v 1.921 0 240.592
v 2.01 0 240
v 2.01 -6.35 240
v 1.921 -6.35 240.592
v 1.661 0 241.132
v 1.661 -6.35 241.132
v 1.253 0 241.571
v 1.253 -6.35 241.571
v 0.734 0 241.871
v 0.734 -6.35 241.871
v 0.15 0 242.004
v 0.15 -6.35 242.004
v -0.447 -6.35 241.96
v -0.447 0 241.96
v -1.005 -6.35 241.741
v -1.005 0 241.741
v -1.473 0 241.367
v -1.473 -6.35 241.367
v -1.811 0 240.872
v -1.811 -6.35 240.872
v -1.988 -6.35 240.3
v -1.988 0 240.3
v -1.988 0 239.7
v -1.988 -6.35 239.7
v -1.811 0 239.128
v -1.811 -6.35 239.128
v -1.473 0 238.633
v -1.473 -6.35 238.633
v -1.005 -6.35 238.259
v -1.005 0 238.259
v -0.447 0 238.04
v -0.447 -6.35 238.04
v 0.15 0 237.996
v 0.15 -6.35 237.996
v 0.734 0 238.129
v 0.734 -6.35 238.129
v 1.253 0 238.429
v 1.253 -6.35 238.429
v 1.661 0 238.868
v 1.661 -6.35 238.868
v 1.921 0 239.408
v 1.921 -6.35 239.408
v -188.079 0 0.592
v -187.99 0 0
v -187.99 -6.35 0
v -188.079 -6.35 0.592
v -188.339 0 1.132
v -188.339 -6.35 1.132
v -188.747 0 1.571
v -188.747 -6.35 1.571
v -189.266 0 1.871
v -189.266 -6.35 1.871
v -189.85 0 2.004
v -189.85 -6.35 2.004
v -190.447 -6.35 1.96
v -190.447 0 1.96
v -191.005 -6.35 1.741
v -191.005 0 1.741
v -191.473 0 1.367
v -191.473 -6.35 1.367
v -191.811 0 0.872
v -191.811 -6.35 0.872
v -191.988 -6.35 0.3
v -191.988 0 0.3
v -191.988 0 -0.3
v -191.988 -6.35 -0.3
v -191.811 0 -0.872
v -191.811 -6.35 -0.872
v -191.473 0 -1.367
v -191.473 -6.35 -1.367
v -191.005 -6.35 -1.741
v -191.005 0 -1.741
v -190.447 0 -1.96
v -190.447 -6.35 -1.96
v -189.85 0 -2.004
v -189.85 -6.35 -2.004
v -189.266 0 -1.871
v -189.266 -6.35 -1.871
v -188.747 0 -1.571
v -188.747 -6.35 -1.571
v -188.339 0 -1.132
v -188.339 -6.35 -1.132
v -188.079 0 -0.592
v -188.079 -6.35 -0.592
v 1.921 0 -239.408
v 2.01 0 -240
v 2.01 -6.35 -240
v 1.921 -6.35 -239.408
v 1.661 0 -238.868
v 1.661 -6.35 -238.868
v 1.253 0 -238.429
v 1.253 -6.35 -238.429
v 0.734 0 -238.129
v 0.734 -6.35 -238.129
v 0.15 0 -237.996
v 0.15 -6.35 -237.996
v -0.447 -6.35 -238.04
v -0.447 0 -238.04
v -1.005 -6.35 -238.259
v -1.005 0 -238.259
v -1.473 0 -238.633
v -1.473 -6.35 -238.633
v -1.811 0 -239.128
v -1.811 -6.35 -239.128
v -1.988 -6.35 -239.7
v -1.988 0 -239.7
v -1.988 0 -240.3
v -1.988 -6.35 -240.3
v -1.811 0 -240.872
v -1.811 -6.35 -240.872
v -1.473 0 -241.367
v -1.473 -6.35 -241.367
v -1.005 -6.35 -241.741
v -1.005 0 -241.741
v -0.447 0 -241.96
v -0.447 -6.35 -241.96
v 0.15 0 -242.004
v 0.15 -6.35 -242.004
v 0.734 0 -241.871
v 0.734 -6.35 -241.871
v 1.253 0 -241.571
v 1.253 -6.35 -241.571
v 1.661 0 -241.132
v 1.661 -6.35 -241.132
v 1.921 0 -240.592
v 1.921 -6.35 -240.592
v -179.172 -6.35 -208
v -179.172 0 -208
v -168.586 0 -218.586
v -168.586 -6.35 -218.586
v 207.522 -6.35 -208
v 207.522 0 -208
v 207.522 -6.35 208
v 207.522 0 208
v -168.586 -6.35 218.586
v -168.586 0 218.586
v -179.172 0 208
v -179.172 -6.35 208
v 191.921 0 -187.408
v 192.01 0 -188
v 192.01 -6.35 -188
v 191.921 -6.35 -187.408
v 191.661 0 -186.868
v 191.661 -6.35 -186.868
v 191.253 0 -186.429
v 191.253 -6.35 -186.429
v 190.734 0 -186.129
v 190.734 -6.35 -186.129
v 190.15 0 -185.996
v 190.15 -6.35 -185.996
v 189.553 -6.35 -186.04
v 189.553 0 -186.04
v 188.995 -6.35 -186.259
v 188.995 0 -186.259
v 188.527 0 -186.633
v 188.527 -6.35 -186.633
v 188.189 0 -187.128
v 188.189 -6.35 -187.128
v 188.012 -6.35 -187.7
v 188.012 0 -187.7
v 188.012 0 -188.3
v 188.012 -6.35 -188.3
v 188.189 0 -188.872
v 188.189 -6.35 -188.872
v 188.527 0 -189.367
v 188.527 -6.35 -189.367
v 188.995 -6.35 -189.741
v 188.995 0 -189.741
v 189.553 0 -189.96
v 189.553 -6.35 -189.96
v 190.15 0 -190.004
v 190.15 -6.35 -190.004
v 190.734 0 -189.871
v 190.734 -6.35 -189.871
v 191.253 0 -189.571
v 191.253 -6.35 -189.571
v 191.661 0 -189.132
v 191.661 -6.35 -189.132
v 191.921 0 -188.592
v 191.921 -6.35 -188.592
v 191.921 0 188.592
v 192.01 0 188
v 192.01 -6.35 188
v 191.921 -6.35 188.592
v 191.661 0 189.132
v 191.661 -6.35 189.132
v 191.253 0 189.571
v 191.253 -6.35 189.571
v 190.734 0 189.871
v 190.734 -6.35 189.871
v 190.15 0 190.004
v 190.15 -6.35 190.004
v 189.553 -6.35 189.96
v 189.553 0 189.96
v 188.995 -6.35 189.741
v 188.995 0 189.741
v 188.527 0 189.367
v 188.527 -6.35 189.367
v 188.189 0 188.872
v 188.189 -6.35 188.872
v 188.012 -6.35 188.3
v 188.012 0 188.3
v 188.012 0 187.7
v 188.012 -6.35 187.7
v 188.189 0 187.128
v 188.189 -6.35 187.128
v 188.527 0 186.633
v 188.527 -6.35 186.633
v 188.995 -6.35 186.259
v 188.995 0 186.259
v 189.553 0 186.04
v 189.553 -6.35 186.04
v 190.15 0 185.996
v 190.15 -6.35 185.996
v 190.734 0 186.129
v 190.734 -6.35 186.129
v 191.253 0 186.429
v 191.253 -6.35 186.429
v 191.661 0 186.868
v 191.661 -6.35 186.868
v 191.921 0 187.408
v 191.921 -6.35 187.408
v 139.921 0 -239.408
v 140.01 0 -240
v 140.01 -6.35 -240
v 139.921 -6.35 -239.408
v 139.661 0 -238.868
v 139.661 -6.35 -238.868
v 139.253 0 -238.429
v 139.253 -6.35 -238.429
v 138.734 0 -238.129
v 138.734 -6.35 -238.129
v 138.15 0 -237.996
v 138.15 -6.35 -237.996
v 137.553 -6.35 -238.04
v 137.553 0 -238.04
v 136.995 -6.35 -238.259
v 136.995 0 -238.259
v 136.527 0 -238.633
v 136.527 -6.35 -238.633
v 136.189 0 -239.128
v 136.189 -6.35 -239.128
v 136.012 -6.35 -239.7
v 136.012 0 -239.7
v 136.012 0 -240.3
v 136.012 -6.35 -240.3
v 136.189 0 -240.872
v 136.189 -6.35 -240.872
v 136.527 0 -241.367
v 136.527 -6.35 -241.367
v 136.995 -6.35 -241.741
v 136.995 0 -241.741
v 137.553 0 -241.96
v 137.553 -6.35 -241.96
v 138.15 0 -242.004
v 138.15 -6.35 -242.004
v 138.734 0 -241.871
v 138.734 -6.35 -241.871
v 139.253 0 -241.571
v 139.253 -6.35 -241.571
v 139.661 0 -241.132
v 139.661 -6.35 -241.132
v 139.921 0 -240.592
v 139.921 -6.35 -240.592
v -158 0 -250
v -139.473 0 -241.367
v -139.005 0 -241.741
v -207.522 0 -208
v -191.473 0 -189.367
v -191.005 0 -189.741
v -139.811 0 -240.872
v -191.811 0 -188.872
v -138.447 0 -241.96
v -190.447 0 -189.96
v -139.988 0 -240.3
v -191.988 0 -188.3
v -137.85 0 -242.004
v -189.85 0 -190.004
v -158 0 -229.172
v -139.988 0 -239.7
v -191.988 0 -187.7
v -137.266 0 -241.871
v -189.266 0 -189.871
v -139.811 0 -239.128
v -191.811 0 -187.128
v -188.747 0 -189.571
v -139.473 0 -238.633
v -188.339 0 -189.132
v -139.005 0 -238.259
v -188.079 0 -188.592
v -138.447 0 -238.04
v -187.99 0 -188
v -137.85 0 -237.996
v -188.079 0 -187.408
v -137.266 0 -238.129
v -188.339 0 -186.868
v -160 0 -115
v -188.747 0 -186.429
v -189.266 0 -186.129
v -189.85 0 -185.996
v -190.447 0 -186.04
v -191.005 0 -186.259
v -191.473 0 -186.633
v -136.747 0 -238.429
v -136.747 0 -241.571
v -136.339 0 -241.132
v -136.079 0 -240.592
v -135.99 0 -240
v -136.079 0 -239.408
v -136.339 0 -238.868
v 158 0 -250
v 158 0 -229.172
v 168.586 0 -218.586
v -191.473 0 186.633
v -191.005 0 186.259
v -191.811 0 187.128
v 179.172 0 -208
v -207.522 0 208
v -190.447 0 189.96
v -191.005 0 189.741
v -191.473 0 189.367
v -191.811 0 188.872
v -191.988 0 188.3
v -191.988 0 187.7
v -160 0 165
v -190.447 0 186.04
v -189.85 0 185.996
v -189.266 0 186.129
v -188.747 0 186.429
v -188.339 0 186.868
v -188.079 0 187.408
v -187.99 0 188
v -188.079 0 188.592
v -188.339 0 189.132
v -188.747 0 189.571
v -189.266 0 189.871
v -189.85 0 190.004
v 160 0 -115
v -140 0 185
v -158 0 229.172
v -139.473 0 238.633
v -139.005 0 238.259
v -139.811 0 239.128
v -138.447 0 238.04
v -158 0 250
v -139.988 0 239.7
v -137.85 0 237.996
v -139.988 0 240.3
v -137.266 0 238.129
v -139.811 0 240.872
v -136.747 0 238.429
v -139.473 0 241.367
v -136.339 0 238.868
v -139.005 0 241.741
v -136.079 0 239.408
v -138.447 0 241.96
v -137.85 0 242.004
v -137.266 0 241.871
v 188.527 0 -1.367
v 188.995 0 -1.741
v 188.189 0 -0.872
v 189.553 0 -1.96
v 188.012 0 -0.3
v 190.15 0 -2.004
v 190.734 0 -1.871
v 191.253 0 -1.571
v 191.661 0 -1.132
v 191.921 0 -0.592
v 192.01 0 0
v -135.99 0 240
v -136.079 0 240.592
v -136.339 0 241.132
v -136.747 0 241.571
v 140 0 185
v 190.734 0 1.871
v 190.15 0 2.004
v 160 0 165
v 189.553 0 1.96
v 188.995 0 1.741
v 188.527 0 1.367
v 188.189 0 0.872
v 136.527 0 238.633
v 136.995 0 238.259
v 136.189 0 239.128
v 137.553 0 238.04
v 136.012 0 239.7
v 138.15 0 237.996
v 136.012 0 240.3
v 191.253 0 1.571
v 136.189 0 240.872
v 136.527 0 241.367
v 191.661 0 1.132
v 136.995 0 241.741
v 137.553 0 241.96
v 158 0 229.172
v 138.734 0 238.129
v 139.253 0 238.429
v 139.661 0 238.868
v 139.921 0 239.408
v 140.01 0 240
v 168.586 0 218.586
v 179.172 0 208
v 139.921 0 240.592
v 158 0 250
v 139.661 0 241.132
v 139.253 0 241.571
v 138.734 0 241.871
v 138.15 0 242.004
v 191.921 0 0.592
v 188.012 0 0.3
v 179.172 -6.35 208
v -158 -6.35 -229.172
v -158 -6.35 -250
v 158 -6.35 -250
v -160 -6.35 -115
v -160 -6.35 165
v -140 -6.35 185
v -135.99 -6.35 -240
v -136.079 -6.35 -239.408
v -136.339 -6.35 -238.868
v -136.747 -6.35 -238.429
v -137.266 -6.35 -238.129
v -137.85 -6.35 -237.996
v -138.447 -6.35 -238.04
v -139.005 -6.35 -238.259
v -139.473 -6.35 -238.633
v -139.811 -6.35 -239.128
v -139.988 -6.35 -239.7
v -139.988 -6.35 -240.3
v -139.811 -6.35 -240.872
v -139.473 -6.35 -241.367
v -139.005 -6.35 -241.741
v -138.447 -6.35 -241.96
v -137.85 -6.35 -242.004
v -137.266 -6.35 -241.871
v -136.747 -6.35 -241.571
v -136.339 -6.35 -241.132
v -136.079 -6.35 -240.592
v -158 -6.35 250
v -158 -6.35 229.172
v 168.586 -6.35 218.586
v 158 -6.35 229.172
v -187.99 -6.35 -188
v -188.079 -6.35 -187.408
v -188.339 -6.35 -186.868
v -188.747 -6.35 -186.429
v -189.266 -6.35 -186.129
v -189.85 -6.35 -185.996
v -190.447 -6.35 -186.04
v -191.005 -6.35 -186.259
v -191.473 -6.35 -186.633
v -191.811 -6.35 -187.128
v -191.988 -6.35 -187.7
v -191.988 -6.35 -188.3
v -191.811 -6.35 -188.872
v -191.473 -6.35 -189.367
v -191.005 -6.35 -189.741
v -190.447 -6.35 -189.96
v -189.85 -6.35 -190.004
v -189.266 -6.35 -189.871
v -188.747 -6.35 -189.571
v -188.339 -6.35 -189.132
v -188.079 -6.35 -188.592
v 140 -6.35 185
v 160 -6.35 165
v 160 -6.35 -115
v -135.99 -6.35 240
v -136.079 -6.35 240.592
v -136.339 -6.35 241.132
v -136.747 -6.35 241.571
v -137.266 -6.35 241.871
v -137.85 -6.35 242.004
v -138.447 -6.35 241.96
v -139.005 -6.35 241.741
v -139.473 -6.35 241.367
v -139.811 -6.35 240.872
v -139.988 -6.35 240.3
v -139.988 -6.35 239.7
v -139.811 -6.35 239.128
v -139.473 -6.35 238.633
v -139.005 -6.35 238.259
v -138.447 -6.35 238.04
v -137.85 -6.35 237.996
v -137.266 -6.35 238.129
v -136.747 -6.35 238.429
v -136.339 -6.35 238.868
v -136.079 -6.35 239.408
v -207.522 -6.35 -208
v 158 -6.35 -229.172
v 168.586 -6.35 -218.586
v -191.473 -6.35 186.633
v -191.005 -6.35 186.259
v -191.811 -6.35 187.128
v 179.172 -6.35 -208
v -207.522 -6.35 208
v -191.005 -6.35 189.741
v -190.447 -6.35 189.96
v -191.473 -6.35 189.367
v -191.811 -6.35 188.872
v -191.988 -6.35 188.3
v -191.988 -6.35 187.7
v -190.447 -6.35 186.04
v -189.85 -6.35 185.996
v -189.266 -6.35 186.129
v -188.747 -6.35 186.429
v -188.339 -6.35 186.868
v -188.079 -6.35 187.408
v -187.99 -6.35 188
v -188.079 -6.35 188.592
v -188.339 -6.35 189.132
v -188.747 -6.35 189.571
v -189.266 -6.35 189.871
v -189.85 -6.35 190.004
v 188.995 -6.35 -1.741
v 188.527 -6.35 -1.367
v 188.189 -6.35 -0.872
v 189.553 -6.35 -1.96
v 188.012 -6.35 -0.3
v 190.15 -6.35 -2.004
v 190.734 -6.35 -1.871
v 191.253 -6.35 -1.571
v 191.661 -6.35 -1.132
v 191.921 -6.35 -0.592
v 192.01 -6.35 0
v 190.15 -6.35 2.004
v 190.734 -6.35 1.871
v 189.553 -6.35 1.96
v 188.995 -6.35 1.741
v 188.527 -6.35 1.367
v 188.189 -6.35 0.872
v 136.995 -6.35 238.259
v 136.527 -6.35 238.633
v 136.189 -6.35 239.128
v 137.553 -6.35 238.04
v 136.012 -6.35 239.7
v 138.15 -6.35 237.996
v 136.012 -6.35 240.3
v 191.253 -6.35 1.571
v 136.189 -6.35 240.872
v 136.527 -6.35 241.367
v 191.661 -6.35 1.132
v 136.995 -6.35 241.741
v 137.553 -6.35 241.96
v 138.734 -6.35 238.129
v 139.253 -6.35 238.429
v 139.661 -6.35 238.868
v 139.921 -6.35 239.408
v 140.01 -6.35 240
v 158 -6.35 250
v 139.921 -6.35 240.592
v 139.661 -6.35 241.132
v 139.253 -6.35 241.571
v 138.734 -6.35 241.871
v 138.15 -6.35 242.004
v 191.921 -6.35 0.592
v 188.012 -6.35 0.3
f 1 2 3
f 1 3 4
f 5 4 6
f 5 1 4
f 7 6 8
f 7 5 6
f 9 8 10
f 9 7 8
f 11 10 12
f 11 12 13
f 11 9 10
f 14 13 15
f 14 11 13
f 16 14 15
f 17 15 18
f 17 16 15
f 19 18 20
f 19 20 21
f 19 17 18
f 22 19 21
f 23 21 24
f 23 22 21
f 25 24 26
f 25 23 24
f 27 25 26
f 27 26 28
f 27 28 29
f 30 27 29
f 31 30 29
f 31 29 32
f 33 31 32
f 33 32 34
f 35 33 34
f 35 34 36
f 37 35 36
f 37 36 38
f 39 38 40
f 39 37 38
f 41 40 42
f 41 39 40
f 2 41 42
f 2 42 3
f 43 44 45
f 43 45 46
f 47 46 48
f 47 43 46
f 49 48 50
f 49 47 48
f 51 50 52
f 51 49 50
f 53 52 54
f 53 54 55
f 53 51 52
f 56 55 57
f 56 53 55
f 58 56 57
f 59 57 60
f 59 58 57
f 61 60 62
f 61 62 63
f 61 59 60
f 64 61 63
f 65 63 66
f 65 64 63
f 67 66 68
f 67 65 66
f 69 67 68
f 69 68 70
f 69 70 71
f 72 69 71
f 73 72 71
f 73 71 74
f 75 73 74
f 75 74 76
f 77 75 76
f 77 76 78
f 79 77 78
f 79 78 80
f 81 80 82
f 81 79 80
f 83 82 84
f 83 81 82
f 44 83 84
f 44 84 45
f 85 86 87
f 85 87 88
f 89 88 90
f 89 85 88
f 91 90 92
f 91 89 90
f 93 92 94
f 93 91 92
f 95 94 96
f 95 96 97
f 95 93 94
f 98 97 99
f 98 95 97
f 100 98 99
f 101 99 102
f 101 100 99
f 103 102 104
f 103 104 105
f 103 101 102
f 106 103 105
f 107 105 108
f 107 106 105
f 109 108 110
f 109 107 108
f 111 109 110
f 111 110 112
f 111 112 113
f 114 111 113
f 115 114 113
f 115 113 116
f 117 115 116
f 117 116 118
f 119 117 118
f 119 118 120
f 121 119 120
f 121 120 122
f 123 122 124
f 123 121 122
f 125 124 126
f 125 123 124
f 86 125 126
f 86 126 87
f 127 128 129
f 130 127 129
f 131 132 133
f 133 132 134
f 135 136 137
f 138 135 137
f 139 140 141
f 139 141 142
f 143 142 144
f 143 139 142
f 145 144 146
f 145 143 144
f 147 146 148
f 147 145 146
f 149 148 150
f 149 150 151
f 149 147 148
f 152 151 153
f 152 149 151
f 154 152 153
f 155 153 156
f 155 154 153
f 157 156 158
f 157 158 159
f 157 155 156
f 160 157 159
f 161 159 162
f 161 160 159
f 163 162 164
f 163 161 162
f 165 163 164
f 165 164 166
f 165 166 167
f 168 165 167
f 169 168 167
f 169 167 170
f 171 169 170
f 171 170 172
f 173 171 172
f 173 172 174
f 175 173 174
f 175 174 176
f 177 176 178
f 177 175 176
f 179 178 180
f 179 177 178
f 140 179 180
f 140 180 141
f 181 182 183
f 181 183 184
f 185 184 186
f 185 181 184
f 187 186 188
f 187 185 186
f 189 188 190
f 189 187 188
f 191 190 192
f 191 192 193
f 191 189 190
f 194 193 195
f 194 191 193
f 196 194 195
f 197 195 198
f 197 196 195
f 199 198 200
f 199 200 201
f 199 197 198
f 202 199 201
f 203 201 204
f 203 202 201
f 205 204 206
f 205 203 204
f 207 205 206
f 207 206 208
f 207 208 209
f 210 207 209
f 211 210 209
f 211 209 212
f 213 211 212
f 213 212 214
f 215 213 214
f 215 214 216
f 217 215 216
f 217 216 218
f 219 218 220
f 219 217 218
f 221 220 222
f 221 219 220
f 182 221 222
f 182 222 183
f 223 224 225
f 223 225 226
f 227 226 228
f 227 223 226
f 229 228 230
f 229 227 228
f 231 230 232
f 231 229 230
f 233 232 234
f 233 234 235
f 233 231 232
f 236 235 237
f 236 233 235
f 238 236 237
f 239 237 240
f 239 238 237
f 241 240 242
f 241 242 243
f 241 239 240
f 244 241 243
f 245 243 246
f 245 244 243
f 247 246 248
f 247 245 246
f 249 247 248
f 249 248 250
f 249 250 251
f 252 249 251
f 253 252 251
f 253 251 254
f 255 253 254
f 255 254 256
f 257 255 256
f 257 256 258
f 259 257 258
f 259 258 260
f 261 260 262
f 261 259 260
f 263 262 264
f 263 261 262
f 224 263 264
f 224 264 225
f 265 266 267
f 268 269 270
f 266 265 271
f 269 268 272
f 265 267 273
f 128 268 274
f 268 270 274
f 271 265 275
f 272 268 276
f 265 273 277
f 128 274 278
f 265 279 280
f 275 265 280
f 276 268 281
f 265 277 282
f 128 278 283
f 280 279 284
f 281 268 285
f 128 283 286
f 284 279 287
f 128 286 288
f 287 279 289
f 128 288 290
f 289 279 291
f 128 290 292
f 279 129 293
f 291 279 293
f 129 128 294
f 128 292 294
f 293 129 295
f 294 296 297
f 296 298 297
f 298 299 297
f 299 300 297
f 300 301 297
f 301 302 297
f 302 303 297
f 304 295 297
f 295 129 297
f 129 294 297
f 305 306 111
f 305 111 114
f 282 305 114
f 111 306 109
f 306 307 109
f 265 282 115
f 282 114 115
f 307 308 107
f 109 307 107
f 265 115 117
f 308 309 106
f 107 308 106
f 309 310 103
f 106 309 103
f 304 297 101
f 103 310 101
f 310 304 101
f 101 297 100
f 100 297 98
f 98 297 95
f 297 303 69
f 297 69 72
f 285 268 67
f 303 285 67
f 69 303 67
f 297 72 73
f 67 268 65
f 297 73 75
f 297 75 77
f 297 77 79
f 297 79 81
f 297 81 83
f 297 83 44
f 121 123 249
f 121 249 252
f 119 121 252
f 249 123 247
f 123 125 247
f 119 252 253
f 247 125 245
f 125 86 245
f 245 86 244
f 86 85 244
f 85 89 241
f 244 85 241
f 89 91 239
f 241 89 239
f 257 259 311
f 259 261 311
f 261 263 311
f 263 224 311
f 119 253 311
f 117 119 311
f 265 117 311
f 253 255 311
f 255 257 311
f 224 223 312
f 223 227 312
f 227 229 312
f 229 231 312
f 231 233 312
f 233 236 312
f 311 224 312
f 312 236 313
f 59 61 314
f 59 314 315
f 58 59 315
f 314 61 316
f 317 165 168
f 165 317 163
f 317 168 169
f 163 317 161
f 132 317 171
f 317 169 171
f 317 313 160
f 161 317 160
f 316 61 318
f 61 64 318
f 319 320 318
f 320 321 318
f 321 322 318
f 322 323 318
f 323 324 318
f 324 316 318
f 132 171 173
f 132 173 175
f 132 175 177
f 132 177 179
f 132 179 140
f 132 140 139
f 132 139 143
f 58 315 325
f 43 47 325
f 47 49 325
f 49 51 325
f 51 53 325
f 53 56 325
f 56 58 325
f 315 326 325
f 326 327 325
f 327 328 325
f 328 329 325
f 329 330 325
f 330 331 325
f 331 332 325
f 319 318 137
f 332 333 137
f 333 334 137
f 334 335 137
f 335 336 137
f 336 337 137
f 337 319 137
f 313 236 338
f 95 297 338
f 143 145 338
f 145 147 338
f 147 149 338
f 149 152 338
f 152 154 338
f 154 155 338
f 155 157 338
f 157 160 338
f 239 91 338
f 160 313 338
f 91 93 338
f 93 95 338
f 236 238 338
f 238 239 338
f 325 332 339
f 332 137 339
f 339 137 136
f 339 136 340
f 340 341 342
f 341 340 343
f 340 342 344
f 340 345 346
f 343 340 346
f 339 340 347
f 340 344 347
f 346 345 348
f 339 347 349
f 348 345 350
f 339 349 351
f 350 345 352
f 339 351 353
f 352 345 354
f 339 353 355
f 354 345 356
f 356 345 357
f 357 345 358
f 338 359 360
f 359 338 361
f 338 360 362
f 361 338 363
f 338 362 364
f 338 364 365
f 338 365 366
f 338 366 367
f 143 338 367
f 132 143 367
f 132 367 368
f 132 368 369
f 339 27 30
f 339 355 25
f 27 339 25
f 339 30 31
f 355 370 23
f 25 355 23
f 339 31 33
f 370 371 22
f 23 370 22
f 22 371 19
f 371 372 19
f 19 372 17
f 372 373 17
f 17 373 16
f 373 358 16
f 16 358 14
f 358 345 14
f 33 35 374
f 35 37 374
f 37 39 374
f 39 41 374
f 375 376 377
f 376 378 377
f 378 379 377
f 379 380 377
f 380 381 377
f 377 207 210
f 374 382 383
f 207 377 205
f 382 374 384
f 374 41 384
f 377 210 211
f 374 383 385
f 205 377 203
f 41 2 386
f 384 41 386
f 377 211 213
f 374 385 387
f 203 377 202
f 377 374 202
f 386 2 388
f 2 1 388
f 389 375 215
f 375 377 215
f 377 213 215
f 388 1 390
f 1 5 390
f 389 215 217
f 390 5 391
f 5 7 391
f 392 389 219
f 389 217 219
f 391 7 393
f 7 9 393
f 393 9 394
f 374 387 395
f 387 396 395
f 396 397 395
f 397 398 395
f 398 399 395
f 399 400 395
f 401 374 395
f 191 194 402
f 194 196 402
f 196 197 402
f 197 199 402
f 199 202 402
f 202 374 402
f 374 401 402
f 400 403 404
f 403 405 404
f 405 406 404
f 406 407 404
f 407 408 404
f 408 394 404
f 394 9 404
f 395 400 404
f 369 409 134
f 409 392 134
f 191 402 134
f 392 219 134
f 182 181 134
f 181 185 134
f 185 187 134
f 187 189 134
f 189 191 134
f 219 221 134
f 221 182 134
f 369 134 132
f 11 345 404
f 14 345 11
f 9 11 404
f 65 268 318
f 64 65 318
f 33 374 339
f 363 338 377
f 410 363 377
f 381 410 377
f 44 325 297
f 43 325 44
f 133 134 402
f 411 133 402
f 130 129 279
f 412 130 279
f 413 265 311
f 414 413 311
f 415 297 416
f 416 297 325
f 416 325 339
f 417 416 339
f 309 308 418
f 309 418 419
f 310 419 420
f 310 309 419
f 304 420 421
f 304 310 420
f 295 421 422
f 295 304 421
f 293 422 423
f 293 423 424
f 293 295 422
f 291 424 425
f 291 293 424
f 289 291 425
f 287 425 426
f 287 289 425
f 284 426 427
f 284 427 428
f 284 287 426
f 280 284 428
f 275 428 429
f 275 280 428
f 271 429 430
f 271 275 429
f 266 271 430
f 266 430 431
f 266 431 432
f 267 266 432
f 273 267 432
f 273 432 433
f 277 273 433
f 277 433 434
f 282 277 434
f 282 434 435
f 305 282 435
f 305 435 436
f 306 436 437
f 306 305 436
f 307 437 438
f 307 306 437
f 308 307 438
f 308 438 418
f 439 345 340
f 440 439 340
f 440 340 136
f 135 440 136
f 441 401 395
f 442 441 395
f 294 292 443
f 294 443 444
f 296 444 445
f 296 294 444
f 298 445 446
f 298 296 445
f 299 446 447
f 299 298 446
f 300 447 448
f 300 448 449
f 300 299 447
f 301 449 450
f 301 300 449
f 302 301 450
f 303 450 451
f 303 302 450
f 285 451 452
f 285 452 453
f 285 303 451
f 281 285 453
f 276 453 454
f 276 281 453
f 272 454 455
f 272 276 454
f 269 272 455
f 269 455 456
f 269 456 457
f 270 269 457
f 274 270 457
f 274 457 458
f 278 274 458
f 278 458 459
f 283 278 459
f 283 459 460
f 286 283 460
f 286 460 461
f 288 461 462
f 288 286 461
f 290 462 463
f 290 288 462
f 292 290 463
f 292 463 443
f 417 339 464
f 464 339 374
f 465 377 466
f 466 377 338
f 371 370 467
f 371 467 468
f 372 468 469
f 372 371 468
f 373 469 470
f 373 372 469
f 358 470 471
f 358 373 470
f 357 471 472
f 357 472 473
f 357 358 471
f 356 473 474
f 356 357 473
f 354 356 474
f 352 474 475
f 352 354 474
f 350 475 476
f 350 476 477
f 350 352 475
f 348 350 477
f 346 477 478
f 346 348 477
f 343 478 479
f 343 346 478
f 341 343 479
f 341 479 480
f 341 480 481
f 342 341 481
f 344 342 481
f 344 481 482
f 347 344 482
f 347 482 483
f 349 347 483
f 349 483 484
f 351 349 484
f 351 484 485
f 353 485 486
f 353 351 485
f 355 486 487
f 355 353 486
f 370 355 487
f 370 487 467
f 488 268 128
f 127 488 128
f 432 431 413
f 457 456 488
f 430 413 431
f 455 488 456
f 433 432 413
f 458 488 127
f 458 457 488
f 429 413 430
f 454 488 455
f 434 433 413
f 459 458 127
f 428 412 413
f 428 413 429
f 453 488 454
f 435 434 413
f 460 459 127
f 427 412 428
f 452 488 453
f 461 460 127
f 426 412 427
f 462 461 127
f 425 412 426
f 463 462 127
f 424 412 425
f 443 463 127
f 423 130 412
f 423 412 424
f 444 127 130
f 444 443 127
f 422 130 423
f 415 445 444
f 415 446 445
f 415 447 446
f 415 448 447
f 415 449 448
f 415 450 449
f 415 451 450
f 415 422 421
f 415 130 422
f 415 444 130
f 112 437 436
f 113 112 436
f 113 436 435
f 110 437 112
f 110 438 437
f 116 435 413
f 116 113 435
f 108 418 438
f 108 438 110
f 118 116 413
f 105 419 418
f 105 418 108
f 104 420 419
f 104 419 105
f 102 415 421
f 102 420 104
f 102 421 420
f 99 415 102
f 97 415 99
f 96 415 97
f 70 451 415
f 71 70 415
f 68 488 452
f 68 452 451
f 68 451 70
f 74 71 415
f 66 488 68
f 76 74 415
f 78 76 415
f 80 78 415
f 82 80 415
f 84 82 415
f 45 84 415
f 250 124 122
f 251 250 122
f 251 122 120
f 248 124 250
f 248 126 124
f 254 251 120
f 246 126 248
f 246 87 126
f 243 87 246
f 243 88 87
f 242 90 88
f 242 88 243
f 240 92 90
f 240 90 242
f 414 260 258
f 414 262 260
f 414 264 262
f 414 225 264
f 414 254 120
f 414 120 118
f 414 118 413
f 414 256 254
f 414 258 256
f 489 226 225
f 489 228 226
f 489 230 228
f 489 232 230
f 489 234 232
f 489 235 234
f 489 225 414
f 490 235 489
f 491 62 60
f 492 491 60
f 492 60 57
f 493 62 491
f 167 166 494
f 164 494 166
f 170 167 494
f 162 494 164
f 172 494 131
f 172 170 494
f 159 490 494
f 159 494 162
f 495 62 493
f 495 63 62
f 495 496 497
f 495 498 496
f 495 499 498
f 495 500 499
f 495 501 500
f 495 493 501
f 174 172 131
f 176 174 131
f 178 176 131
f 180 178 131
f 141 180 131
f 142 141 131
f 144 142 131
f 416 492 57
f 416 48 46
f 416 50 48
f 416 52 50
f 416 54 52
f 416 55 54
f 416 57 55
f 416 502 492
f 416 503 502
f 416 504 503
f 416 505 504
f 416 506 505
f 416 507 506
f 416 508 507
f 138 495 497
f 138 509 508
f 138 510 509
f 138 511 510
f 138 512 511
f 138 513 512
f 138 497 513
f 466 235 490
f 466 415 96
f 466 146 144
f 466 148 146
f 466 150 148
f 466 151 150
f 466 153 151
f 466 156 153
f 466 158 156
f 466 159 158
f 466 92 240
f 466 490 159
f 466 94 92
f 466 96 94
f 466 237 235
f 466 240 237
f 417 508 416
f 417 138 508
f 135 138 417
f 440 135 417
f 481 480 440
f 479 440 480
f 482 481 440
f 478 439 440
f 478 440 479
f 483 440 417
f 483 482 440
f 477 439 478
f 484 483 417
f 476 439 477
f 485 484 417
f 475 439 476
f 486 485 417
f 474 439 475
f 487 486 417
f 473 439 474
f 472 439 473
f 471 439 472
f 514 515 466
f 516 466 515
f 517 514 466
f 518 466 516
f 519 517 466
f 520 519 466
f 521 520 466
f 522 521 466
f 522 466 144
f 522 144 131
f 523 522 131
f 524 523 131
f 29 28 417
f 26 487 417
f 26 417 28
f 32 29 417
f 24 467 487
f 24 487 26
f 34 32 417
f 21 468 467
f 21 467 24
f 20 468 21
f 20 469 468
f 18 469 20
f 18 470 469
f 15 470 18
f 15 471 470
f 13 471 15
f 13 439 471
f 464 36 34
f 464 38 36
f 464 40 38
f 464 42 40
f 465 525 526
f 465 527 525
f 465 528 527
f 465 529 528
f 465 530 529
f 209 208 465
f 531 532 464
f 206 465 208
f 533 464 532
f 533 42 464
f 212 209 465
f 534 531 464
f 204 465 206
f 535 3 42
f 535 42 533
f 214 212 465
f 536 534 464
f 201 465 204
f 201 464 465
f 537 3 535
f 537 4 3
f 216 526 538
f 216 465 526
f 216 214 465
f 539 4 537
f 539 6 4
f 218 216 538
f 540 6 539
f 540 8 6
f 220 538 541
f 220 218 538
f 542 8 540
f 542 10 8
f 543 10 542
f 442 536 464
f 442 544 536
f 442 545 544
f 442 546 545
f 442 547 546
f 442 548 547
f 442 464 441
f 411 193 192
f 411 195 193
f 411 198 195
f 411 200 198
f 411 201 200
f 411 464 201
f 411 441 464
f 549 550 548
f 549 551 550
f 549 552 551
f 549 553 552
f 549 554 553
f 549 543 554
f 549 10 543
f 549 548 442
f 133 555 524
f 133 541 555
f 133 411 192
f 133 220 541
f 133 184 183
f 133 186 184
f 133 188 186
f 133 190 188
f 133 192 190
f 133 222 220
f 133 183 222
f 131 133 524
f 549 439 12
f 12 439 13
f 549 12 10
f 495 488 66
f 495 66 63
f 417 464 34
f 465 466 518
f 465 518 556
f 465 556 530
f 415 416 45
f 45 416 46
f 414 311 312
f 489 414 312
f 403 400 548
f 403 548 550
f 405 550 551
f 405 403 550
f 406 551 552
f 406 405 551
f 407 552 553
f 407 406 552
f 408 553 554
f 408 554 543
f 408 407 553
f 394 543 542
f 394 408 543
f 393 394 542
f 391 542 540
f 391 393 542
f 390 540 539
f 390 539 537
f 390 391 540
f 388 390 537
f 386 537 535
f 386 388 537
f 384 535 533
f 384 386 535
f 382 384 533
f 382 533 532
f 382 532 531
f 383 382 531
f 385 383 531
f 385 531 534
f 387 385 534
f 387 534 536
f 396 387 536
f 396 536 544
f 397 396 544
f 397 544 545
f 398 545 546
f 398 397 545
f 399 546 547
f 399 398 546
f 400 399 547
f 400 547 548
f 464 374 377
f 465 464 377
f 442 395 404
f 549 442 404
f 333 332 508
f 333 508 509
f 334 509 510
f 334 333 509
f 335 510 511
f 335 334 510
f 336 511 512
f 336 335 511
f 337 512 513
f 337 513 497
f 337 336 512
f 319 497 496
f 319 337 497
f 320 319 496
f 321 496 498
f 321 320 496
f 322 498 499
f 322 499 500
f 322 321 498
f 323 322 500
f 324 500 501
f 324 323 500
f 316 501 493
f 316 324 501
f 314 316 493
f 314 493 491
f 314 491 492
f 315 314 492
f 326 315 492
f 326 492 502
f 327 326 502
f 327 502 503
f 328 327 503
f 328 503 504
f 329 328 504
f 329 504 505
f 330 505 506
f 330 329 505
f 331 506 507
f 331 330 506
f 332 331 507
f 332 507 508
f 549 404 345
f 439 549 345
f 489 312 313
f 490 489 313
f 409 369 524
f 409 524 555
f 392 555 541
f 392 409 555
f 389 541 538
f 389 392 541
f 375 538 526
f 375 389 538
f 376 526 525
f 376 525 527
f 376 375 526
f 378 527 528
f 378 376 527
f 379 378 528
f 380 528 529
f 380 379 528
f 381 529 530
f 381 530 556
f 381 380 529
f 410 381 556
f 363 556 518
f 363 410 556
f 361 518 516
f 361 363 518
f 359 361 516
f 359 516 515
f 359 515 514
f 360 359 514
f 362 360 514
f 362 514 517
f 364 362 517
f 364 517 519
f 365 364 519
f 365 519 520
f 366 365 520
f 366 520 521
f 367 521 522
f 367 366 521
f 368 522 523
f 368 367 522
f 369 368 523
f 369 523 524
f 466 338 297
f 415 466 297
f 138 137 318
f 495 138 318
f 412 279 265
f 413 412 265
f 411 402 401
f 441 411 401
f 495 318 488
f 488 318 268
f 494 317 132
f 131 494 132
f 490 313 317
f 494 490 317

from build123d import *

# Parameters (mm, degrees)
F0_R     = 2.01
F1_DEPTH = 6.35


# Not quite as in the source:
# - a feature names something its author has since deleted; it is built from what else it names


with BuildPart() as f1:
    # F0 (on Front) → F1 (new body)
    with BuildSketch(Plane.XZ):
        Polygon((158, -229.1715728753), (168.5857864376, -218.5857864376), (179.1715728753, -208), (207.5215728753, -208), (207.5215728753, 208), (179.1715728753, 208), (168.5857864376, 218.5857864376), (158, 229.1715728753), (158, 240), (158, 250), (-158, 250), (-158, 240), (-158, 229.1715728753), (-168.5857864376, 218.5857864376), (-179.1715728753, 208), (-207.5215728753, 208), (-207.5215728753, -208), (-179.1715728753, -208), (-168.5857864376, -218.5857864376), (-158, -229.1715728753), (-158, -240), (-158, -250), (158, -250), (158, -240), align=None)
        with Locations((-190, -188)):
            Circle(F0_R, mode=Mode.SUBTRACT)
        with Locations((-138, -240)):
            Circle(F0_R, mode=Mode.SUBTRACT)
        with Locations((0, -240)):
            Circle(F0_R, mode=Mode.SUBTRACT)
        with Locations((138, -240)):
            Circle(F0_R, mode=Mode.SUBTRACT)
        with Locations((190, -188)):
            Circle(F0_R, mode=Mode.SUBTRACT)
        with Locations((-190, 0)):
            Circle(F0_R, mode=Mode.SUBTRACT)
        with Locations((-190, 188)):
            Circle(F0_R, mode=Mode.SUBTRACT)
        with Locations((-138, 240)):
            Circle(F0_R, mode=Mode.SUBTRACT)
        Polygon((-140, 185), (140, 185), (160, 165), (160, -115), (0, -115), (-160, -115), (-160, 165), align=None, mode=Mode.SUBTRACT)
        with Locations((190, 0)):
            Circle(F0_R, mode=Mode.SUBTRACT)
        with Locations((0, 240)):
            Circle(F0_R, mode=Mode.SUBTRACT)
        with Locations((138, 240)):
            Circle(F0_R, mode=Mode.SUBTRACT)
        with Locations((190, 188)):
            Circle(F0_R, mode=Mode.SUBTRACT)
    extrude(amount=F1_DEPTH)


solid = f1.part
